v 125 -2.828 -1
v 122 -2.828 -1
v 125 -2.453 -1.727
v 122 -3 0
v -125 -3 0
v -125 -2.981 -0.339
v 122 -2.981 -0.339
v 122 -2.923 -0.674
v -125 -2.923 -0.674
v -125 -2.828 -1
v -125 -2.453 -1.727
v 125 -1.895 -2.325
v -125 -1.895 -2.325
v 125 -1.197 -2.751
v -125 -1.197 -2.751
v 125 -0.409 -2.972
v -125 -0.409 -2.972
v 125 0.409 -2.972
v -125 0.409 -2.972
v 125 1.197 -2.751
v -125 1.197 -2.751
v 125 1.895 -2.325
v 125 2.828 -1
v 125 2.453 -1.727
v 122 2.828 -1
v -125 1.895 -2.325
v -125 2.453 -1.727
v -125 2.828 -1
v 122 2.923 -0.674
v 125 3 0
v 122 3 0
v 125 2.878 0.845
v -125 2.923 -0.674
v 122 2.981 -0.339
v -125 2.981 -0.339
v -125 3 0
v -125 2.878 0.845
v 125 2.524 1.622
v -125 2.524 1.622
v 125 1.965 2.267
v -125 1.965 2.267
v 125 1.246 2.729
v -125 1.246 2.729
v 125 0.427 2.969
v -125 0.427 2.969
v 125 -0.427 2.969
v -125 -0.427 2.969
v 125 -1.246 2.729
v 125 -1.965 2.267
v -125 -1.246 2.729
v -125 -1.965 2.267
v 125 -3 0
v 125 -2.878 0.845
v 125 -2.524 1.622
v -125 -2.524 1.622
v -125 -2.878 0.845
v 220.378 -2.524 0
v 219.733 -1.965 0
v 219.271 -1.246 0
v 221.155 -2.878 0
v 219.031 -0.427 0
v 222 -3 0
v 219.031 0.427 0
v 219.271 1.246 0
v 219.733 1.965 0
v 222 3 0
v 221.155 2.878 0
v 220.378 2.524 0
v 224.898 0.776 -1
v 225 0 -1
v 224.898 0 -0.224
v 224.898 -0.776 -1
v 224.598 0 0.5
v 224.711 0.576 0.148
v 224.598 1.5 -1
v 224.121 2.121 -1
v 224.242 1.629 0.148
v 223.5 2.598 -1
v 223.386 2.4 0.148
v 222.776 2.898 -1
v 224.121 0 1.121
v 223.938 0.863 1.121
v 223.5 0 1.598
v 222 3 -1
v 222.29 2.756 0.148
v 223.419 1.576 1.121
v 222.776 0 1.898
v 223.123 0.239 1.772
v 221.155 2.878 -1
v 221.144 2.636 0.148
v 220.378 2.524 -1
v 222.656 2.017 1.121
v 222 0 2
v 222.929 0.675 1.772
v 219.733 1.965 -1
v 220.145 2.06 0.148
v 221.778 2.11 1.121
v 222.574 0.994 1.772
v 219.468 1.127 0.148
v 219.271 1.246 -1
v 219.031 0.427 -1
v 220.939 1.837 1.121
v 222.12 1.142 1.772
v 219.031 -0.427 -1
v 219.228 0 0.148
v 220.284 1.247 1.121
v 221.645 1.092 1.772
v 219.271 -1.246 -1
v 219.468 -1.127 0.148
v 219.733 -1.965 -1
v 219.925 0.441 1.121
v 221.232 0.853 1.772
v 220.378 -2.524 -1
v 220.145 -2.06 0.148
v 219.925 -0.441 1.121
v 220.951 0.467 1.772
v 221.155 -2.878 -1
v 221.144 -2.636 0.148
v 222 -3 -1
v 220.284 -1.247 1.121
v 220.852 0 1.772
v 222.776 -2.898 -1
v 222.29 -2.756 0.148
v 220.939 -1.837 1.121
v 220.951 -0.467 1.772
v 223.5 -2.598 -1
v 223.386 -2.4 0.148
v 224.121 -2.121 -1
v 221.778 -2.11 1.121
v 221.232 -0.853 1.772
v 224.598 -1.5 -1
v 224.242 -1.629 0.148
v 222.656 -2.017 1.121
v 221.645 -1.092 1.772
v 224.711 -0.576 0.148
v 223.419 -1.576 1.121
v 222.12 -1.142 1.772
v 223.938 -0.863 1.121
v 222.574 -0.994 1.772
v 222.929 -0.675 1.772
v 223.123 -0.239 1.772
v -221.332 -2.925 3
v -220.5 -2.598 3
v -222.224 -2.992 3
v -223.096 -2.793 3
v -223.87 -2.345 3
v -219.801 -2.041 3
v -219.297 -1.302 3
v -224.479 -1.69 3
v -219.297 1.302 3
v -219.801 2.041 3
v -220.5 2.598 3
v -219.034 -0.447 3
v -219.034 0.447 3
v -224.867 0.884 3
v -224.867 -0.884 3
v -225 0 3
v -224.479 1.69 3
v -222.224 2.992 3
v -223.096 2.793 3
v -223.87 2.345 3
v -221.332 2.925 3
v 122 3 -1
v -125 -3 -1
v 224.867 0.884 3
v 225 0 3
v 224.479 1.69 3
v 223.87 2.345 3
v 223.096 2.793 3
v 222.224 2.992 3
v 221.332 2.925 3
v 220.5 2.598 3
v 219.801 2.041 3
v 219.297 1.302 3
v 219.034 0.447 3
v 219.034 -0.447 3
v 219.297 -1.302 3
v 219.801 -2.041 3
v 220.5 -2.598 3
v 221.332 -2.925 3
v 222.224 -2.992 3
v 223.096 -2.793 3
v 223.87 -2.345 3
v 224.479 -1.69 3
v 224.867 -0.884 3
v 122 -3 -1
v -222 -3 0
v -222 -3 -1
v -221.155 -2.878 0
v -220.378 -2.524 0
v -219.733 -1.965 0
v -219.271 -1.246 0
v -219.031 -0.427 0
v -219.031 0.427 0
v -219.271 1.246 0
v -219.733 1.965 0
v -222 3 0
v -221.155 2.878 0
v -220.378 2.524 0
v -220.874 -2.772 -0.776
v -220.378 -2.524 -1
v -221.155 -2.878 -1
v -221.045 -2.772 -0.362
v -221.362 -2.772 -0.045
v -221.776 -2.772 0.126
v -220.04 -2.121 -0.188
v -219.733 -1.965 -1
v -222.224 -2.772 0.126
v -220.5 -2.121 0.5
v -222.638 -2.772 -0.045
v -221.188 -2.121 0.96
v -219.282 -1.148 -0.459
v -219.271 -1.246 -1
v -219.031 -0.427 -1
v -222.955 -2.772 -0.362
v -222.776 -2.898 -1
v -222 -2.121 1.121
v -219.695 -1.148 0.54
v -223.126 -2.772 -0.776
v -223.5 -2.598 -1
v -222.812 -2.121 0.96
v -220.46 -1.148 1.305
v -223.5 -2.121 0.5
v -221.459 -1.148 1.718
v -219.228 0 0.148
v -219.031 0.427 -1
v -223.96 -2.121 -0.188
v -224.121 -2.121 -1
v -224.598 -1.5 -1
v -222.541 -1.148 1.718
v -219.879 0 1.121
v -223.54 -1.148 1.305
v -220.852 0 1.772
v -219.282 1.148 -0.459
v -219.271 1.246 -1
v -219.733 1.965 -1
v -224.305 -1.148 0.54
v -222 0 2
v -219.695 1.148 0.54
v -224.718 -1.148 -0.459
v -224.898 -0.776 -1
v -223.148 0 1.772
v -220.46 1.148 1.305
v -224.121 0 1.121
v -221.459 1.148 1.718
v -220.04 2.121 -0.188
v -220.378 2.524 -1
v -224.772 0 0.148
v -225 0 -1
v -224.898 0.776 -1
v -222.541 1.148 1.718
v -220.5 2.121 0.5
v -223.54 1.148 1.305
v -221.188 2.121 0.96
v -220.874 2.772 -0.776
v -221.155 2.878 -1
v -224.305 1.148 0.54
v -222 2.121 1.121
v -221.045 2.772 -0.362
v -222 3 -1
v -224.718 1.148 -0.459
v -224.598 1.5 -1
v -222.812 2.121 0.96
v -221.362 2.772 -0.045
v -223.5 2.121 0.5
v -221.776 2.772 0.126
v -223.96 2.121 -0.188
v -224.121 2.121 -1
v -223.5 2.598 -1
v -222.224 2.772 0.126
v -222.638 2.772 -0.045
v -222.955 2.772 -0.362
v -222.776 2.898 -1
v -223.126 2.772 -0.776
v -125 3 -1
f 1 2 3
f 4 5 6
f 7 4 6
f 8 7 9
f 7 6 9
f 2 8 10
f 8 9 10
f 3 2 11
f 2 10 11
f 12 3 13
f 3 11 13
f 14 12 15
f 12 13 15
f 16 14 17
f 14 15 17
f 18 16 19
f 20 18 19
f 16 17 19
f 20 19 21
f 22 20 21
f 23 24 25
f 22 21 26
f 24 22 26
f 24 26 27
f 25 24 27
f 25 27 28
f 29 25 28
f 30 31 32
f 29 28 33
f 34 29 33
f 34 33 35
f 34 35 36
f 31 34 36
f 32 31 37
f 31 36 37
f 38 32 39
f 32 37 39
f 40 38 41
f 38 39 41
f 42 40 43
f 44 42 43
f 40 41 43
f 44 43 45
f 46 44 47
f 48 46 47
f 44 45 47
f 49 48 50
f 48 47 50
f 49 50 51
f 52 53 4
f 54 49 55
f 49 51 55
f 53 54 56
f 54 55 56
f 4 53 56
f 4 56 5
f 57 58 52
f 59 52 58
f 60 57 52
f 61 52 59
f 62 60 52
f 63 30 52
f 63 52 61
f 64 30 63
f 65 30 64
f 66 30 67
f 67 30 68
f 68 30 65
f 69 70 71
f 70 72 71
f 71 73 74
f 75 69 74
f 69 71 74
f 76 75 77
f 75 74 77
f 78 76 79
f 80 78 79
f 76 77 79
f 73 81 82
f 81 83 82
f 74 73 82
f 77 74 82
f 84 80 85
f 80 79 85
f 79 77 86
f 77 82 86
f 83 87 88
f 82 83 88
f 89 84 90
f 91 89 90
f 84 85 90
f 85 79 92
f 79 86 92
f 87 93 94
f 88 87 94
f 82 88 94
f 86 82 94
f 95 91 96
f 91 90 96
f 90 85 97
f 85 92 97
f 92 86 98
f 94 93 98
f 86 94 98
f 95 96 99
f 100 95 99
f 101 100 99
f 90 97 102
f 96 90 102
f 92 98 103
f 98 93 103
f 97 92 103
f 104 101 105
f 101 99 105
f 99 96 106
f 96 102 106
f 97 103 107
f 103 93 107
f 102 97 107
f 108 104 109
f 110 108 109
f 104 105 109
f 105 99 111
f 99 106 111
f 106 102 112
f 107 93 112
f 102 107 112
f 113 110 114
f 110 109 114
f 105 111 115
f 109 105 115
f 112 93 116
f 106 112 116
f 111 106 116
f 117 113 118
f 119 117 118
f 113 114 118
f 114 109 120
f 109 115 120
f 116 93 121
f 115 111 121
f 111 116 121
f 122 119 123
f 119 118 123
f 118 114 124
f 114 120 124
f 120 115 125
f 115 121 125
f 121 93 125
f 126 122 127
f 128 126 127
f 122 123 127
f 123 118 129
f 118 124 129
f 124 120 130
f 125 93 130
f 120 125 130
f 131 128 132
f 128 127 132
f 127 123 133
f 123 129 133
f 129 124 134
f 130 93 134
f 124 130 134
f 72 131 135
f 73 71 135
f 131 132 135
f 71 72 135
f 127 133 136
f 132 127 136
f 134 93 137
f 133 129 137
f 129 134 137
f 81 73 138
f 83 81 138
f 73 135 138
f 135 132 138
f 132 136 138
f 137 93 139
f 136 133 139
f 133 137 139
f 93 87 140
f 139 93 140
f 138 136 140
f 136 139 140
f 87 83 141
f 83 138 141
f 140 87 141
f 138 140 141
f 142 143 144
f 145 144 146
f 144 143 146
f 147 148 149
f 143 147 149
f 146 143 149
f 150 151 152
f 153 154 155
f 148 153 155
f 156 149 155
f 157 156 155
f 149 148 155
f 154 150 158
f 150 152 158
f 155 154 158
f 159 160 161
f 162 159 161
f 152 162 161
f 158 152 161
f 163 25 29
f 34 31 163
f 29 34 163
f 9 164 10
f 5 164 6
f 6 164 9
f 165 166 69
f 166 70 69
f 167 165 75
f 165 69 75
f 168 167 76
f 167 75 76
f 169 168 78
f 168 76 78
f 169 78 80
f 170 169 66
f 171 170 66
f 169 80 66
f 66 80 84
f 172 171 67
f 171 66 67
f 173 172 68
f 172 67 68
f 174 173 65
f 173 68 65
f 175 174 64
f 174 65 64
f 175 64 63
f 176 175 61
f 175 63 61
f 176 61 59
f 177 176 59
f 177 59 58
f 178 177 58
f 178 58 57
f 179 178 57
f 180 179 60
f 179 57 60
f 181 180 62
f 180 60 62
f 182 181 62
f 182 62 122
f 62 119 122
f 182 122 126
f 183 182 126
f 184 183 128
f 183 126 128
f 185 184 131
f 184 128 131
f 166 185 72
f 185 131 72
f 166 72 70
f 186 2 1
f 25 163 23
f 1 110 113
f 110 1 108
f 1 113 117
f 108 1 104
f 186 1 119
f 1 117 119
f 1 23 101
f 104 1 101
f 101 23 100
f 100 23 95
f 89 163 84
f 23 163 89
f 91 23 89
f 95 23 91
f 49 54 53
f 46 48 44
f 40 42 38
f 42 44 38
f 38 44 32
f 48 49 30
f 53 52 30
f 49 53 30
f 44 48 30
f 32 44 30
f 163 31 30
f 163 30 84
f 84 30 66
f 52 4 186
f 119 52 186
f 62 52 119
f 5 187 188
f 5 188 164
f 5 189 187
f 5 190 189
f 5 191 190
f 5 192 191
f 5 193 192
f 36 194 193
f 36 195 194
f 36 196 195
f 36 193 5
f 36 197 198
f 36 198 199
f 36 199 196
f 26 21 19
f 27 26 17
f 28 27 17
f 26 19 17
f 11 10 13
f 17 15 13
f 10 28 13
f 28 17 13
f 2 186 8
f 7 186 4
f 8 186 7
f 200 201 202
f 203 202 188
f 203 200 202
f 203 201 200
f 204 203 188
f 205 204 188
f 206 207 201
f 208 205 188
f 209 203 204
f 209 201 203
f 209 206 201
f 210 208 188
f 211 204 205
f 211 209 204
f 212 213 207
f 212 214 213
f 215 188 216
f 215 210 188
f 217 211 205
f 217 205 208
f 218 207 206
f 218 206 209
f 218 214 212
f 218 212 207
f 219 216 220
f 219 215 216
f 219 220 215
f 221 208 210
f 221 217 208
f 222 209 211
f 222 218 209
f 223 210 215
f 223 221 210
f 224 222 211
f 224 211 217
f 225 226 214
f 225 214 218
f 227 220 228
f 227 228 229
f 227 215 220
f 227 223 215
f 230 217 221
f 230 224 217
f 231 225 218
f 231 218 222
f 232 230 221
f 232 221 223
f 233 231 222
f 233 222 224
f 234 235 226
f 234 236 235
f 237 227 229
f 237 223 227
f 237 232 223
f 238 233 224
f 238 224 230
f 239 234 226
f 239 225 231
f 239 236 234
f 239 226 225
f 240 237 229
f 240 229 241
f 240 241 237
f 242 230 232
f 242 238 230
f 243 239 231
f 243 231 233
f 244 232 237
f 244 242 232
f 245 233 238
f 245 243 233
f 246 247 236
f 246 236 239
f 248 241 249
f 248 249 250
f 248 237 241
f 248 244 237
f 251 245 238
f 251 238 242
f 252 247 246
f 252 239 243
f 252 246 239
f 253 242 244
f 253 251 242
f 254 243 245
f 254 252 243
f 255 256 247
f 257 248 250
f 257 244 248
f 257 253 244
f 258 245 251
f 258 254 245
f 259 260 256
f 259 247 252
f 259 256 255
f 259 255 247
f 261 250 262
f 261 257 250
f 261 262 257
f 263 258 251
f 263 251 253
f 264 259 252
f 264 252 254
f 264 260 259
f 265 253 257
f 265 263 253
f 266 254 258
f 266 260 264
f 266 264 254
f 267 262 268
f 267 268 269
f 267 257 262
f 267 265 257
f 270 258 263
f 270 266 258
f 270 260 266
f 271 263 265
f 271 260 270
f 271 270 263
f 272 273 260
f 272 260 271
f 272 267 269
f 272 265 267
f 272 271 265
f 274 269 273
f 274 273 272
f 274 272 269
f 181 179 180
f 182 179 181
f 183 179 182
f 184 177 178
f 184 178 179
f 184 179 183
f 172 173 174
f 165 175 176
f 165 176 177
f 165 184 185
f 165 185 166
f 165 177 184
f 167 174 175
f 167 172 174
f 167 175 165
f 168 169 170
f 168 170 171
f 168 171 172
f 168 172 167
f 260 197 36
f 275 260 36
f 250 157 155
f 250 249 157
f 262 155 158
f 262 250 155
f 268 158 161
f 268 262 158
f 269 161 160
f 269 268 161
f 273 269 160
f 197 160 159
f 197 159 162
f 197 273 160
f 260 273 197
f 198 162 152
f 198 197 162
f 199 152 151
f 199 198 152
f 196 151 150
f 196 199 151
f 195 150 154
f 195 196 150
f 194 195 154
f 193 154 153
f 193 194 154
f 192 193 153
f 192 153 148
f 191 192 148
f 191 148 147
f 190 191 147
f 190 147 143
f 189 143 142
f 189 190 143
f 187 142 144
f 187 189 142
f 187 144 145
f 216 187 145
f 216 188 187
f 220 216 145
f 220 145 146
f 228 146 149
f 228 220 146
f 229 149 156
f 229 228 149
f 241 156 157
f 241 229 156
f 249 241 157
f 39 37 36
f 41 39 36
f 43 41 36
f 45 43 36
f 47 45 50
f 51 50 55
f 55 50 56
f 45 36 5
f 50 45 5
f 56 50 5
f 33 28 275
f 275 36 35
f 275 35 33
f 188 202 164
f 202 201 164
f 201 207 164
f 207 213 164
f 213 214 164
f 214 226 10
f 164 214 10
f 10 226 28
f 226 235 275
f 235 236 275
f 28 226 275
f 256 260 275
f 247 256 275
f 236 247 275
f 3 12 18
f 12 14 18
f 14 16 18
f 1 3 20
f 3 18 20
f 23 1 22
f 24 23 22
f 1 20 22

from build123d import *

# Parameters (mm, degrees)
SKETCH8_W               = 97
SKETCH8_H               = 6
SKETCH8_W_2             = 100
BOSS_EXTRUDE1_DEPTH     = 1
CUT_EXTRUDE2_DEPTH      = 223.056299168
CUT_EXTRUDE2_DEPTH_BACK = 223.056299168
SKETCH20_R              = 3
SKETCH20_3_R            = 3
BOSS_EXTRUDE2_DEPTH     = 4


# Read off the part's stored shape, not the designer's step: Cut-Revolve4
with BuildPart() as part:
    # Sketch1 → Revolve2 (revolve)
    with BuildSketch(Plane.XY, mode=Mode.PRIVATE) as revolve2_sk:
        Polygon((-125, 0), (125, 0), (125, 3), (0, 3), (-125, 3), align=None)
    revolve(revolve2_sk.sketch.rotate(Axis((-125, 0, 0), (1, 0, 0)), 180), axis=Axis((-125, 0, 0), (1, 0, 0)))

    # Sketch8 → Boss-Extrude1 (add)
    with BuildSketch(Plane.XY):
        with Locations((-173.5, 0)):
            Rectangle(SKETCH8_W, SKETCH8_H)
        with Locations((172, 0)):
            Rectangle(SKETCH8_W_2, SKETCH8_H)
    extrude(amount=-BOSS_EXTRUDE1_DEPTH)

    # Sketch20 → Cut-Extrude2 (cut, two sides: drawn at the far end of the back side and taken through both)
    with BuildSketch(Plane(origin=(0, 0, -1), x_dir=(-1, 0, 0), z_dir=(0, 0, -1)).offset(-CUT_EXTRUDE2_DEPTH_BACK)):
        with Locations((222, 0)):
            Circle(SKETCH20_R)
        with Locations((-222, 0)):
            Circle(SKETCH20_R)
    extrude(amount=CUT_EXTRUDE2_DEPTH + CUT_EXTRUDE2_DEPTH_BACK, mode=Mode.SUBTRACT)

    # Sketch20<3> → Boss-Extrude2 (add, symmetric)
    with BuildSketch(Plane(origin=(0, 0, -1), x_dir=(-1, 0, 0), z_dir=(0, 0, -1))):
        with Locations((222, 0)):
            Circle(SKETCH20_3_R)
    boss_extrude2 = extrude(amount=BOSS_EXTRUDE2_DEPTH, both=True)

    # Sketch22 → Cut-Revolve3 (revolve, cut)
    with BuildSketch(Plane(origin=(0, 0, -1), x_dir=(-1, 0, 0), z_dir=(0, 0, -1))):
        with BuildLine():
            Line((222, 3), (222, -3))
            ThreePointArc((222, -3), (225, 0), (222, 3))
        make_face()
    revolve(axis=Axis((-222, 3, -1), (0, -1, 0)), mode=Mode.SUBTRACT)


with BuildPart() as cut_revolve3_kept_piece:
    # of the separate pieces the step leaves, the one the design keeps (cut_revolve3_pieces_kept)
    add(part.part.solids().sort_by_distance((-225, 0, 3))[0])

    # Mirror3: Boss-Extrude2 across plane
    add(boss_extrude2.mirror(Plane(origin=(0, 0, 0), x_dir=(0, 0, 1), z_dir=(1, 0, 0))))

    # Cut-Revolve4 outline → Cut-Revolve4 (revolve, cut)
    with BuildSketch(Plane(origin=(222, 0, 0), x_dir=(1, 0, 0), z_dir=(0, -1, 0))):
        with BuildLine():
            Line((0, 2), (0, -5))
            Line((0, -5), (3, -5))
            Line((3, -5), (3, -1.000000003))
            ThreePointArc((3, -1.000000003), (2.121320345, 1.121320342), (0, 2))
        make_face()
    revolve(axis=Axis((222, 0, 0), (0, 0, 1)), mode=Mode.SUBTRACT)


solid = cut_revolve3_kept_piece.part
